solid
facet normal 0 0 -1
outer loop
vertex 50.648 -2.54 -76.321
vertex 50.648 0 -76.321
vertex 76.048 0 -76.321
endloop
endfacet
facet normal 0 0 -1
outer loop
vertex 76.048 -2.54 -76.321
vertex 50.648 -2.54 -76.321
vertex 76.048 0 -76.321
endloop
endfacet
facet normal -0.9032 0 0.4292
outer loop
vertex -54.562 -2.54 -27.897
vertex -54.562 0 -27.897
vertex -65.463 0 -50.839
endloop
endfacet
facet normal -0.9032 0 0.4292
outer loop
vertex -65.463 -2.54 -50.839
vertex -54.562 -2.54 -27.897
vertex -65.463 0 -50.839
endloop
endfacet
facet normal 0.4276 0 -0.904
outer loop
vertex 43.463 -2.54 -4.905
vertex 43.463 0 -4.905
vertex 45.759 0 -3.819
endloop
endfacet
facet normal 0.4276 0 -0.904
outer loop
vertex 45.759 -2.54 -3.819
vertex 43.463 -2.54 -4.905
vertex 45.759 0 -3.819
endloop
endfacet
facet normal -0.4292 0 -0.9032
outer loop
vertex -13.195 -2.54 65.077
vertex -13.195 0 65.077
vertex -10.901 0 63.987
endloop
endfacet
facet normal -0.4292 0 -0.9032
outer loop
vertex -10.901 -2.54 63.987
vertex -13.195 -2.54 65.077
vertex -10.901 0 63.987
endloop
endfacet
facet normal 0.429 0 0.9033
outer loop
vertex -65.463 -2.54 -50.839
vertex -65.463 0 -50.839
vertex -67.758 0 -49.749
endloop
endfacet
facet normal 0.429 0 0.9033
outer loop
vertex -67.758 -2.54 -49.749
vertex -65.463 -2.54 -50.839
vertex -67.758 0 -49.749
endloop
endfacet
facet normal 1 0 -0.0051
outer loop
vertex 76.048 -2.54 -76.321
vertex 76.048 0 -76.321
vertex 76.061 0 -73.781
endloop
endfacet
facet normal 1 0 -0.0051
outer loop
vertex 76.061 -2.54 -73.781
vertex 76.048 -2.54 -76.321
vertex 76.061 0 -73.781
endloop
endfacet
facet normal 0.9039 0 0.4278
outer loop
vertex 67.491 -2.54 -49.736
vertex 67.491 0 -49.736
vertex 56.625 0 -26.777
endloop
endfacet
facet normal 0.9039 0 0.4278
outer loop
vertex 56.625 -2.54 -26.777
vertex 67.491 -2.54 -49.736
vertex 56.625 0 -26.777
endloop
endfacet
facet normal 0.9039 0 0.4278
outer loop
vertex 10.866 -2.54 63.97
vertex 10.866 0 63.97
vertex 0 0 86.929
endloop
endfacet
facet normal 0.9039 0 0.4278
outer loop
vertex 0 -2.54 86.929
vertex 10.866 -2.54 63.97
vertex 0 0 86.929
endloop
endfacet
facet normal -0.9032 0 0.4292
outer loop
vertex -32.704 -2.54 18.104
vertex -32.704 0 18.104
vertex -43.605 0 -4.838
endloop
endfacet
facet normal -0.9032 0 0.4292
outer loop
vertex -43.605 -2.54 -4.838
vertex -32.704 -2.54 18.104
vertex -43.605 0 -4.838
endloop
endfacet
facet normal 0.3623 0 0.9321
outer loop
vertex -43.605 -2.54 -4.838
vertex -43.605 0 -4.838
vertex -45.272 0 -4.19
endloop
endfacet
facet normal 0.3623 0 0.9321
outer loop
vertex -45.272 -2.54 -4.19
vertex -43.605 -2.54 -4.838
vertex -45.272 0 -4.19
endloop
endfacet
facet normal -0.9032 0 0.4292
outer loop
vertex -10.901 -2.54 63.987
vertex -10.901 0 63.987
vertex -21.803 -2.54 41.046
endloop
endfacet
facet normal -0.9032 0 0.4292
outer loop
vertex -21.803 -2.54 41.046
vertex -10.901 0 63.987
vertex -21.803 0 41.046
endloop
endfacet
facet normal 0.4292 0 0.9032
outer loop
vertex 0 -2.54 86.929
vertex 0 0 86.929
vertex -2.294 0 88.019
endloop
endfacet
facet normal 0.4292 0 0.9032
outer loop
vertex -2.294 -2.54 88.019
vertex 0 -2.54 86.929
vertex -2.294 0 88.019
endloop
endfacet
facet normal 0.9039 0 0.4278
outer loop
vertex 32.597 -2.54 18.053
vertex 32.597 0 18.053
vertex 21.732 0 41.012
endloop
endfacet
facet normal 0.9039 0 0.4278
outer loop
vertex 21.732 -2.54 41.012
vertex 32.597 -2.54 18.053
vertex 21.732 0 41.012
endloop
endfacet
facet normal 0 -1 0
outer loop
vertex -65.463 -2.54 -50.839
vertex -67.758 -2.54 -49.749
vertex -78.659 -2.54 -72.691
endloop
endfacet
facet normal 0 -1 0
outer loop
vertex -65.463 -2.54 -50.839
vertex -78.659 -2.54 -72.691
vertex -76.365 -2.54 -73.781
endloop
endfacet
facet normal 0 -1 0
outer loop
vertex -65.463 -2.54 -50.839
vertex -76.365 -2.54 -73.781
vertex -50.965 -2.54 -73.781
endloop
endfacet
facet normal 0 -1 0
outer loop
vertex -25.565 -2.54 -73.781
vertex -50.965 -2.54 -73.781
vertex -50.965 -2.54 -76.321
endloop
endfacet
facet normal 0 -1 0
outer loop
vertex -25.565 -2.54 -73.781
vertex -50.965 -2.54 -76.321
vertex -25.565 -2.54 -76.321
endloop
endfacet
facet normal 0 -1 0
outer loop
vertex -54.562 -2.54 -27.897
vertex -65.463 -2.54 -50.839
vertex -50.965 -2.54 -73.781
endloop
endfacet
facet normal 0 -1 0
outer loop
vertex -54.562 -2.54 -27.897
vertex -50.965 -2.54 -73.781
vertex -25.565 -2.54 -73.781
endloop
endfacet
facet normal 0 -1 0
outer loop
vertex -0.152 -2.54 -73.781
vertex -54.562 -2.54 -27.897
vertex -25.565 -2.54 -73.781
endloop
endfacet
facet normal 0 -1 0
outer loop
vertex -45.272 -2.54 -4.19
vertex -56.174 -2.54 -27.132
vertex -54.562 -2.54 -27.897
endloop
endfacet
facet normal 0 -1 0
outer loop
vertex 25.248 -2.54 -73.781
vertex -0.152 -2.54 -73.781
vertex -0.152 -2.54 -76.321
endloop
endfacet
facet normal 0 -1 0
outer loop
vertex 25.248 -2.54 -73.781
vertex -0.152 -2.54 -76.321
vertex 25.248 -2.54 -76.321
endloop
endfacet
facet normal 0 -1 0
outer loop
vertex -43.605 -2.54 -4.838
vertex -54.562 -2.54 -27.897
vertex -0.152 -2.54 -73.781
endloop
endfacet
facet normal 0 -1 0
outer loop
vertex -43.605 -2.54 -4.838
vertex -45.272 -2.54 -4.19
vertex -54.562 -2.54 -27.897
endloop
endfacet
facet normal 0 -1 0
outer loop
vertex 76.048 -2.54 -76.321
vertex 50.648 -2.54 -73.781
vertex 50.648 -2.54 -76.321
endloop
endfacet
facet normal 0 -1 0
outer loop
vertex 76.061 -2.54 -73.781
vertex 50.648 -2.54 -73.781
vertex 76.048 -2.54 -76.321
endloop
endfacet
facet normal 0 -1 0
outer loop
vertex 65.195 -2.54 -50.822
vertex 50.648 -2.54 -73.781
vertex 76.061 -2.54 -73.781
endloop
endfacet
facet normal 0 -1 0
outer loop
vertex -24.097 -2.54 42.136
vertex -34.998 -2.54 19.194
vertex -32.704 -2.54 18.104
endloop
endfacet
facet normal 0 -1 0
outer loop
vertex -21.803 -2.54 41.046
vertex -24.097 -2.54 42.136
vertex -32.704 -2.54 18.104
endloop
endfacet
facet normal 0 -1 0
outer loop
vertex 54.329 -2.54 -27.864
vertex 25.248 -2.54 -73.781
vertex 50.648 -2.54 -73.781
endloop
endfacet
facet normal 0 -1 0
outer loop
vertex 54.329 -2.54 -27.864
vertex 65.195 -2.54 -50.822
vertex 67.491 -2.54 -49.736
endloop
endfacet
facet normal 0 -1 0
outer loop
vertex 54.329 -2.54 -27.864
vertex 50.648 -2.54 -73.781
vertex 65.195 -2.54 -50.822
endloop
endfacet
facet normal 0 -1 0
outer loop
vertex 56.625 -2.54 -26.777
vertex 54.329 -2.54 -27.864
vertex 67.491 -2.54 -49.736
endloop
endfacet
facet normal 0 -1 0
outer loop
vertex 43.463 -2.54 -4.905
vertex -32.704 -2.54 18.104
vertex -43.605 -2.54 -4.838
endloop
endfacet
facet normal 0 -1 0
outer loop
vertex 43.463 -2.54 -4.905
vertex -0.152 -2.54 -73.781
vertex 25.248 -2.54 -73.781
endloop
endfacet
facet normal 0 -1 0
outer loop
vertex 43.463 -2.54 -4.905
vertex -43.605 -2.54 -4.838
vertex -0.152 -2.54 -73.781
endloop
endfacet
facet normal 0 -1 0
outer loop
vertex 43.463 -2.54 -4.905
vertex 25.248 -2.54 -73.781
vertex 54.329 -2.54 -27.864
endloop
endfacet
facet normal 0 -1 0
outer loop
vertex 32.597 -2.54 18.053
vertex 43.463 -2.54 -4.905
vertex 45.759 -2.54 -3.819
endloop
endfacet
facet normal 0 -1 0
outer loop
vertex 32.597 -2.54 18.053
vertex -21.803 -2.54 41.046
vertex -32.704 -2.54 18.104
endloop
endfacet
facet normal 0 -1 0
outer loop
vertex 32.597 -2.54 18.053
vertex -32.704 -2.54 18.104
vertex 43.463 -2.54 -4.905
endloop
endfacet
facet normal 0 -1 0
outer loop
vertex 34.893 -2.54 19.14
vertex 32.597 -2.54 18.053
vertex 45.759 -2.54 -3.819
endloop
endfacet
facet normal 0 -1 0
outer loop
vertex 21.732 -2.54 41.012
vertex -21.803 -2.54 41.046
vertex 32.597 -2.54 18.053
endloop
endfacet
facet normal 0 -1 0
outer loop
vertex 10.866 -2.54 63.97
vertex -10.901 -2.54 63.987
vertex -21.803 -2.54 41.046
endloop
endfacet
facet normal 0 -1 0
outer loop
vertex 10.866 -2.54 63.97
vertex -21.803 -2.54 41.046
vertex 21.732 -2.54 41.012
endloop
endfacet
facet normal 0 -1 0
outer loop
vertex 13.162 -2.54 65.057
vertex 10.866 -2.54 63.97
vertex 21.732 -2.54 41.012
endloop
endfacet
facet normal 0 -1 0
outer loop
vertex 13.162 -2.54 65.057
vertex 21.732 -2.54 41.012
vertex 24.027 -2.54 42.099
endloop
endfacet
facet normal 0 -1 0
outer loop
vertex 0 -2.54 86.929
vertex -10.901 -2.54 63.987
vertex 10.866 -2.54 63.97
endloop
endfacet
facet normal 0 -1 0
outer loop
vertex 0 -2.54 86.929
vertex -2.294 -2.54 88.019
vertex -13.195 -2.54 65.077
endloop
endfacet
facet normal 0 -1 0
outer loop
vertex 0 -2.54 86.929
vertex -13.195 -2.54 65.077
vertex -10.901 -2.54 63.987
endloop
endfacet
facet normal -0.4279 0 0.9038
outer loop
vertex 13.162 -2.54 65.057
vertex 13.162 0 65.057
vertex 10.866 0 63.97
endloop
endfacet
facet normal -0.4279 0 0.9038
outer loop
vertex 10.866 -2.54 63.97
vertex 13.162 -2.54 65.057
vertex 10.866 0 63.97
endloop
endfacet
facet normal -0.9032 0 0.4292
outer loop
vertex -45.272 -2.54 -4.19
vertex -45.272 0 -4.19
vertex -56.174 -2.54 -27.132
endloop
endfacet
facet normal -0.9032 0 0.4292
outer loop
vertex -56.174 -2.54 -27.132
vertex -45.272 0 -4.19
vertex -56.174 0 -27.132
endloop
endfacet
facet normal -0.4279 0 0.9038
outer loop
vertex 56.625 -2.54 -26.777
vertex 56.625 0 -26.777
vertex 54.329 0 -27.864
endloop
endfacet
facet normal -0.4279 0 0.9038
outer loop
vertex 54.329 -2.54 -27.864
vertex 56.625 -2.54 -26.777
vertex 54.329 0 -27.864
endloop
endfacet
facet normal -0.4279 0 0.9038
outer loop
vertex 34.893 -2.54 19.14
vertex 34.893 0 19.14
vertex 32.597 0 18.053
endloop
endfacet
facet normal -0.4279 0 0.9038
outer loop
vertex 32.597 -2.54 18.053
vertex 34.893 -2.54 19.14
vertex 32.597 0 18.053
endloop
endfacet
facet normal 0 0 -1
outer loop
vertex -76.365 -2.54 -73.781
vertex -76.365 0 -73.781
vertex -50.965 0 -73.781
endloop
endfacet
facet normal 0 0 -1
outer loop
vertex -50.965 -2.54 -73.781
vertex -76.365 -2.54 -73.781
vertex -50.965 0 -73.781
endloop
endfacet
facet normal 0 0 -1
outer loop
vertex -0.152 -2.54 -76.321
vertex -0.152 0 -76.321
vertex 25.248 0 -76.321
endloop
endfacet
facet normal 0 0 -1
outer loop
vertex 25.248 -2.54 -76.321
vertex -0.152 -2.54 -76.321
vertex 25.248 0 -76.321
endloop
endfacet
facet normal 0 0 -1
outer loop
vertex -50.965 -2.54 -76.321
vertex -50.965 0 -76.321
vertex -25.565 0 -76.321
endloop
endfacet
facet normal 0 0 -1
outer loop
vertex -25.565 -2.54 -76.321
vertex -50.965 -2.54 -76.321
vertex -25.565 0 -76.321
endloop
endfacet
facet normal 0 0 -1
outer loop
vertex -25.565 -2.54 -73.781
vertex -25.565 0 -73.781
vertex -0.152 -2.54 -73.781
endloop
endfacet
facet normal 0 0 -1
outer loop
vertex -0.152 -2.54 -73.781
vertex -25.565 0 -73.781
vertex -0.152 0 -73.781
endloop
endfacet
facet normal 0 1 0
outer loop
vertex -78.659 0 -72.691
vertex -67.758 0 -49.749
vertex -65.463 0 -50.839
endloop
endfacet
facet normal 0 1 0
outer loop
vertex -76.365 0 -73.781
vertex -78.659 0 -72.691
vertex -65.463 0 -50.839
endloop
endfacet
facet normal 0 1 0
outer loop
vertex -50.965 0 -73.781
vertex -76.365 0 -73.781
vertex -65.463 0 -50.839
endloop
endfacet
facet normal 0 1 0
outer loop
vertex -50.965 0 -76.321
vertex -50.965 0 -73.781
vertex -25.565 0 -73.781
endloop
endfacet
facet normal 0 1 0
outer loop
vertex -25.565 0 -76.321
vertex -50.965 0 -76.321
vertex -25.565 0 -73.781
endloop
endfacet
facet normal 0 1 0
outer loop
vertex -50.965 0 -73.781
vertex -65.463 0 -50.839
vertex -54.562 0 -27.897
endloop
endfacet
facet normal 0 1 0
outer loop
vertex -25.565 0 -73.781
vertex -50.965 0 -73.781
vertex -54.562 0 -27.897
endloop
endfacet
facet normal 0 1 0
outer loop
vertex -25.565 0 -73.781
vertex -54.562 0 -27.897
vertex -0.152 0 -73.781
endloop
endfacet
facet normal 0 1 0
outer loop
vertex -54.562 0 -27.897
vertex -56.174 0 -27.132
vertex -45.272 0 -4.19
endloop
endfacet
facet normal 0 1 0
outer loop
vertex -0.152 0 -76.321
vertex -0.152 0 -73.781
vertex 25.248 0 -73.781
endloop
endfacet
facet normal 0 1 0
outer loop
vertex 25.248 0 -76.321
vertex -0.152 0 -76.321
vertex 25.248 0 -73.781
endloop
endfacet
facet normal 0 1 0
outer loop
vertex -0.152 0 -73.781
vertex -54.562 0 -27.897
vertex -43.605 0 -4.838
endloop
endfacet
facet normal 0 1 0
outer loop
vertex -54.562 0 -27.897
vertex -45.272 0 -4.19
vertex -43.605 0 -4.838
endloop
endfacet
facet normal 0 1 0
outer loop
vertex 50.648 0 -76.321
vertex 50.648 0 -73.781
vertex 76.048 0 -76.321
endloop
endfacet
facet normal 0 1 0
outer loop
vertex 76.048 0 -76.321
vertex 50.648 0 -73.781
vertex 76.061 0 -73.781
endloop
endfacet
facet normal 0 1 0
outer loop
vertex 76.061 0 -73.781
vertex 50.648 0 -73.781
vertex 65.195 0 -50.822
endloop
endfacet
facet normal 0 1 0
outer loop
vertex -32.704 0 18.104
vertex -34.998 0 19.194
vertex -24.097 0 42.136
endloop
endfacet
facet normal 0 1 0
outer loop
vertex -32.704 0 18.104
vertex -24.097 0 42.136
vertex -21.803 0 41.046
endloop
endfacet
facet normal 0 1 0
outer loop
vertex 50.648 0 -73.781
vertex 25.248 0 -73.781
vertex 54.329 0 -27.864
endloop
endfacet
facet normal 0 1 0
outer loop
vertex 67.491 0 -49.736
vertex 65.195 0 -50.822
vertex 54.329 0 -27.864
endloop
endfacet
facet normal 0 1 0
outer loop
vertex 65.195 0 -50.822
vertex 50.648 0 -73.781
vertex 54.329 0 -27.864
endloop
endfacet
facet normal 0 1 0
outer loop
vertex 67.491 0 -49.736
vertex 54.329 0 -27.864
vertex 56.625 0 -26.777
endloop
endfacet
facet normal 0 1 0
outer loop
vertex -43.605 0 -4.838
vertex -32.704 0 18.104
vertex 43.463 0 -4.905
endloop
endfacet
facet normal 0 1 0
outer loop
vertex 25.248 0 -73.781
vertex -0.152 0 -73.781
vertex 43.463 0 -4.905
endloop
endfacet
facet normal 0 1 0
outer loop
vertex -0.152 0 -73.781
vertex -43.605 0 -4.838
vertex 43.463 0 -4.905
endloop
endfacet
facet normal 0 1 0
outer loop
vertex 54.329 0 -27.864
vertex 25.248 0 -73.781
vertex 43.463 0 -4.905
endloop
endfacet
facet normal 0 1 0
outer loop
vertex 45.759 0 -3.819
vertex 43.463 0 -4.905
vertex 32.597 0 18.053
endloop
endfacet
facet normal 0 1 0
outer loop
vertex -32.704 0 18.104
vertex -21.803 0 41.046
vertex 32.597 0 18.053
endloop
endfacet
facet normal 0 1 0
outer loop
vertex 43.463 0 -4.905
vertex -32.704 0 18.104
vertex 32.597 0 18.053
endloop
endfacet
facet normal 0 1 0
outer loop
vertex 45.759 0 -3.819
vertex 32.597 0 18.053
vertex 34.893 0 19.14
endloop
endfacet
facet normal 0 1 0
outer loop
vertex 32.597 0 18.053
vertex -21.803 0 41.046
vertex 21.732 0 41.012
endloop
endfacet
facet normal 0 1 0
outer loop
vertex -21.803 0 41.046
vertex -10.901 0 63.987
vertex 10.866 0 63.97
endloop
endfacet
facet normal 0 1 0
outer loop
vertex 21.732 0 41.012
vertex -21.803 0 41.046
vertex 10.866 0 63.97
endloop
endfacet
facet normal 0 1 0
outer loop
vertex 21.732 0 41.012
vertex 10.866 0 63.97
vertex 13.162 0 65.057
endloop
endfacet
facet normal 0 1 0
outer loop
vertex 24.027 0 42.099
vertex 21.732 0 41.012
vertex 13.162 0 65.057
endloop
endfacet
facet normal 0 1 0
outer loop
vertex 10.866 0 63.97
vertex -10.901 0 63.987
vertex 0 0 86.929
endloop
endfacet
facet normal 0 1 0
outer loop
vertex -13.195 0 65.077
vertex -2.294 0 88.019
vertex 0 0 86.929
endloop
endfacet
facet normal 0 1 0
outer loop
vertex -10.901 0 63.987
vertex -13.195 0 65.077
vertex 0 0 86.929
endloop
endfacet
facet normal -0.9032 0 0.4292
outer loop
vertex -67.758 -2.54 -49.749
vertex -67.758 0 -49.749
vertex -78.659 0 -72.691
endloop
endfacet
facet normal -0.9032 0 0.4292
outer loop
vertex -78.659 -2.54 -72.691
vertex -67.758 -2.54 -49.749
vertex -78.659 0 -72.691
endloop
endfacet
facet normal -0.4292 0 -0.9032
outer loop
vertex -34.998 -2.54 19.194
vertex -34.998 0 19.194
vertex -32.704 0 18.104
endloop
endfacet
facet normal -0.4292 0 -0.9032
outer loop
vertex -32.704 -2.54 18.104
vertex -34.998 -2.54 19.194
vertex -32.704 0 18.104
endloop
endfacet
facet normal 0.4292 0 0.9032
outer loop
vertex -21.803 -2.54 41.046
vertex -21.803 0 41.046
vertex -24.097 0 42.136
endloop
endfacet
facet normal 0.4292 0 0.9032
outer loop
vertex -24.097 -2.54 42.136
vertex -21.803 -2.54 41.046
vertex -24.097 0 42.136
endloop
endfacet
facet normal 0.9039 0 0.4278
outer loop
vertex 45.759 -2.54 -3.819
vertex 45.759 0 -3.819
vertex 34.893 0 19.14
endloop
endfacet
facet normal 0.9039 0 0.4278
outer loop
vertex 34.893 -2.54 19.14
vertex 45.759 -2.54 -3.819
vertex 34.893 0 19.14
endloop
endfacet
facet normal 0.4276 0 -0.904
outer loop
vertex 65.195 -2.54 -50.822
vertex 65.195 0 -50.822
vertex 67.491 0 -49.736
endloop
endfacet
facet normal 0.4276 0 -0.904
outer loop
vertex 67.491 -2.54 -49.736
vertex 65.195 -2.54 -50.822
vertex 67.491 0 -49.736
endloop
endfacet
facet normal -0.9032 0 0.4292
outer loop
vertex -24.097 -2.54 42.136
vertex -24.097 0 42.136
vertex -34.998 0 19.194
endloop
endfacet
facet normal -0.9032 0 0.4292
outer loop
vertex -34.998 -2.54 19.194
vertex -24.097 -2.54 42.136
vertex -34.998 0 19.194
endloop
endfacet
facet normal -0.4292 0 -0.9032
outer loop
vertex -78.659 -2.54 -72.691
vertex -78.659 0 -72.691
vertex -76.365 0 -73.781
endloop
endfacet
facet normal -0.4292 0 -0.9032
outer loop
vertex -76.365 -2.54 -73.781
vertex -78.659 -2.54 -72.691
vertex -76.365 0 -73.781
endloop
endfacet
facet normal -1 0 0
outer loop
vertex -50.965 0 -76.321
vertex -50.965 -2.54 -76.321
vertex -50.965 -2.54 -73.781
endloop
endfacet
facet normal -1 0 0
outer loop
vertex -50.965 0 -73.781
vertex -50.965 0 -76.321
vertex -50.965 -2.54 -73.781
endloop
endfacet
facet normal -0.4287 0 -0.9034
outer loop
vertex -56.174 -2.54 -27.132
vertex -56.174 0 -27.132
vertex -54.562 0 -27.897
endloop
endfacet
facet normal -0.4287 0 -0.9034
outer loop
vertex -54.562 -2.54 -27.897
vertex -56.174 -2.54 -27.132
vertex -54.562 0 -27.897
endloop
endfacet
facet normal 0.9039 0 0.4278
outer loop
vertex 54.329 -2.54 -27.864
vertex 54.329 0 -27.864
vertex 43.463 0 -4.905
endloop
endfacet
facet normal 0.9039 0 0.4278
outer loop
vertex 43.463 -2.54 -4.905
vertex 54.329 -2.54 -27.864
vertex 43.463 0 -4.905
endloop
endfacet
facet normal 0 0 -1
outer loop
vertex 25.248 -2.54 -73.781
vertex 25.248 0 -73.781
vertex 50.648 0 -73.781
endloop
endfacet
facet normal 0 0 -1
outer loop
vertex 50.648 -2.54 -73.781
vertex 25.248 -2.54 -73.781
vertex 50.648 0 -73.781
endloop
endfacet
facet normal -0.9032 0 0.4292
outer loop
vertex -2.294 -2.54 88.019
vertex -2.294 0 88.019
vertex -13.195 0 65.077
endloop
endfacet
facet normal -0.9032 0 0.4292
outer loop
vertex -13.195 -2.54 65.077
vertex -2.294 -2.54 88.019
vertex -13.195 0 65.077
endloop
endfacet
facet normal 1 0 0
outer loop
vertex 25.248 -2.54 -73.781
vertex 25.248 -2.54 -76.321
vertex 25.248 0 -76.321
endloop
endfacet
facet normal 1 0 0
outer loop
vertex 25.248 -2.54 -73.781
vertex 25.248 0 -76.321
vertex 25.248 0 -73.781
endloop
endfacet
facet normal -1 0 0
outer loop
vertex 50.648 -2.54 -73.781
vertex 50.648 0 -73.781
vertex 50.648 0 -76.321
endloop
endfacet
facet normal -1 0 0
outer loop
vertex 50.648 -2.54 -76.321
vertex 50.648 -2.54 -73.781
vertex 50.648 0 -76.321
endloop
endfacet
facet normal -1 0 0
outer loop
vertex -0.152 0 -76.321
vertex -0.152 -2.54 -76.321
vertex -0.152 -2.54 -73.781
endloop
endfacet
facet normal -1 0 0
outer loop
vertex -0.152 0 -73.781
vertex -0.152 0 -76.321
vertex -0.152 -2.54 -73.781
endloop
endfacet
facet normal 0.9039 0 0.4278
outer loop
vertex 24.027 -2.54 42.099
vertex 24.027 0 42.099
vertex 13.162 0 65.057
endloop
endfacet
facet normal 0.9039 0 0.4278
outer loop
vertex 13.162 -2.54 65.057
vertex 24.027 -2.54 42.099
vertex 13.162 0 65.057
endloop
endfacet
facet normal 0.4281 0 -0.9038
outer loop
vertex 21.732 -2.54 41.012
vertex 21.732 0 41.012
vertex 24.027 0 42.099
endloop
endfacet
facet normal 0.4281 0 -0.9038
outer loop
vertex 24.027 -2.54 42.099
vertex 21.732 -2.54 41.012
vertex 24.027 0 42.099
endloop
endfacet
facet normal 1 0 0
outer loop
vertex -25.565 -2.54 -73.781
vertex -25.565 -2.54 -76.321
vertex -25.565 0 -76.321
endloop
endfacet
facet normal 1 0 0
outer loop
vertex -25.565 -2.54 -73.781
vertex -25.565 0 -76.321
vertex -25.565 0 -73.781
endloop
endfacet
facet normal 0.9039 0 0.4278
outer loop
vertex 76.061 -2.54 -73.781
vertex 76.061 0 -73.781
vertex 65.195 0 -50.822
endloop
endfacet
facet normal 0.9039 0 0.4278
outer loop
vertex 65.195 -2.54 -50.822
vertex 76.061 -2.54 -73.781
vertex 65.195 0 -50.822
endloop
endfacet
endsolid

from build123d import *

# Parameters (mm, degrees)
F0_W     = 25.4
F0_H     = 2.54
F1_DEPTH = 2.54


with BuildPart() as f1:
    # F0 (on Front) → F1 (new body)
    with BuildSketch(Plane.XZ):
        Polygon((0, 86.929028), (-10.90126, 63.987308), (-21.80252, 41.045588), (-32.703781, 18.103867), (-43.605041, -4.837853), (-54.562222, -27.897259), (-65.463482, -50.838979), (-76.364742, -73.780699), (-50.964742, -73.780699), (-25.564742, -73.780699), (-0.152042, -73.780699), (25.247958, -73.780699), (50.647958, -73.780699), (76.060658, -73.780699), (65.19485, -50.822167), (54.329041, -27.863634), (43.463233, -4.905102), (32.597425, 18.053431), (21.731617, 41.011963), (10.865808, 63.970496), align=None)
        Polygon((-13.195432, 65.077434), (-10.90126, 63.987308), (0, 86.929028), (-2.294172, 88.019154), align=None)
        Polygon((-32.703781, 18.103867), (-21.80252, 41.045588), (-24.096692, 42.135714), (-34.997953, 19.193993), align=None)
        Polygon((13.161662, 65.057076), (10.865808, 63.970496), (21.731617, 41.011963), (24.02747, 42.098544), align=None)
        Polygon((-54.562222, -27.897259), (-43.605041, -4.837853), (-45.272266, -4.189892), (-56.173526, -27.131612), align=None)
        Polygon((34.893278, 19.140012), (32.597425, 18.053431), (43.463233, -4.905102), (45.759086, -3.818521), align=None)
        Polygon((-76.364742, -73.780699), (-65.463482, -50.838979), (-67.757654, -49.748853), (-78.658914, -72.690573), align=None)
        Polygon((56.624895, -26.777053), (54.329041, -27.863634), (65.19485, -50.822167), (67.490703, -49.735586), align=None)
        with Locations((-38.264742, -75.050699)):
            Rectangle(F0_W, F0_H)
        Polygon((76.047958, -76.320699), (76.060658, -73.780699), (50.647958, -73.780699), (50.647958, -76.320699), align=None)
        with Locations((12.547958, -75.050699)):
            Rectangle(F0_W, F0_H)
    extrude(amount=F1_DEPTH)


solid = f1.part
